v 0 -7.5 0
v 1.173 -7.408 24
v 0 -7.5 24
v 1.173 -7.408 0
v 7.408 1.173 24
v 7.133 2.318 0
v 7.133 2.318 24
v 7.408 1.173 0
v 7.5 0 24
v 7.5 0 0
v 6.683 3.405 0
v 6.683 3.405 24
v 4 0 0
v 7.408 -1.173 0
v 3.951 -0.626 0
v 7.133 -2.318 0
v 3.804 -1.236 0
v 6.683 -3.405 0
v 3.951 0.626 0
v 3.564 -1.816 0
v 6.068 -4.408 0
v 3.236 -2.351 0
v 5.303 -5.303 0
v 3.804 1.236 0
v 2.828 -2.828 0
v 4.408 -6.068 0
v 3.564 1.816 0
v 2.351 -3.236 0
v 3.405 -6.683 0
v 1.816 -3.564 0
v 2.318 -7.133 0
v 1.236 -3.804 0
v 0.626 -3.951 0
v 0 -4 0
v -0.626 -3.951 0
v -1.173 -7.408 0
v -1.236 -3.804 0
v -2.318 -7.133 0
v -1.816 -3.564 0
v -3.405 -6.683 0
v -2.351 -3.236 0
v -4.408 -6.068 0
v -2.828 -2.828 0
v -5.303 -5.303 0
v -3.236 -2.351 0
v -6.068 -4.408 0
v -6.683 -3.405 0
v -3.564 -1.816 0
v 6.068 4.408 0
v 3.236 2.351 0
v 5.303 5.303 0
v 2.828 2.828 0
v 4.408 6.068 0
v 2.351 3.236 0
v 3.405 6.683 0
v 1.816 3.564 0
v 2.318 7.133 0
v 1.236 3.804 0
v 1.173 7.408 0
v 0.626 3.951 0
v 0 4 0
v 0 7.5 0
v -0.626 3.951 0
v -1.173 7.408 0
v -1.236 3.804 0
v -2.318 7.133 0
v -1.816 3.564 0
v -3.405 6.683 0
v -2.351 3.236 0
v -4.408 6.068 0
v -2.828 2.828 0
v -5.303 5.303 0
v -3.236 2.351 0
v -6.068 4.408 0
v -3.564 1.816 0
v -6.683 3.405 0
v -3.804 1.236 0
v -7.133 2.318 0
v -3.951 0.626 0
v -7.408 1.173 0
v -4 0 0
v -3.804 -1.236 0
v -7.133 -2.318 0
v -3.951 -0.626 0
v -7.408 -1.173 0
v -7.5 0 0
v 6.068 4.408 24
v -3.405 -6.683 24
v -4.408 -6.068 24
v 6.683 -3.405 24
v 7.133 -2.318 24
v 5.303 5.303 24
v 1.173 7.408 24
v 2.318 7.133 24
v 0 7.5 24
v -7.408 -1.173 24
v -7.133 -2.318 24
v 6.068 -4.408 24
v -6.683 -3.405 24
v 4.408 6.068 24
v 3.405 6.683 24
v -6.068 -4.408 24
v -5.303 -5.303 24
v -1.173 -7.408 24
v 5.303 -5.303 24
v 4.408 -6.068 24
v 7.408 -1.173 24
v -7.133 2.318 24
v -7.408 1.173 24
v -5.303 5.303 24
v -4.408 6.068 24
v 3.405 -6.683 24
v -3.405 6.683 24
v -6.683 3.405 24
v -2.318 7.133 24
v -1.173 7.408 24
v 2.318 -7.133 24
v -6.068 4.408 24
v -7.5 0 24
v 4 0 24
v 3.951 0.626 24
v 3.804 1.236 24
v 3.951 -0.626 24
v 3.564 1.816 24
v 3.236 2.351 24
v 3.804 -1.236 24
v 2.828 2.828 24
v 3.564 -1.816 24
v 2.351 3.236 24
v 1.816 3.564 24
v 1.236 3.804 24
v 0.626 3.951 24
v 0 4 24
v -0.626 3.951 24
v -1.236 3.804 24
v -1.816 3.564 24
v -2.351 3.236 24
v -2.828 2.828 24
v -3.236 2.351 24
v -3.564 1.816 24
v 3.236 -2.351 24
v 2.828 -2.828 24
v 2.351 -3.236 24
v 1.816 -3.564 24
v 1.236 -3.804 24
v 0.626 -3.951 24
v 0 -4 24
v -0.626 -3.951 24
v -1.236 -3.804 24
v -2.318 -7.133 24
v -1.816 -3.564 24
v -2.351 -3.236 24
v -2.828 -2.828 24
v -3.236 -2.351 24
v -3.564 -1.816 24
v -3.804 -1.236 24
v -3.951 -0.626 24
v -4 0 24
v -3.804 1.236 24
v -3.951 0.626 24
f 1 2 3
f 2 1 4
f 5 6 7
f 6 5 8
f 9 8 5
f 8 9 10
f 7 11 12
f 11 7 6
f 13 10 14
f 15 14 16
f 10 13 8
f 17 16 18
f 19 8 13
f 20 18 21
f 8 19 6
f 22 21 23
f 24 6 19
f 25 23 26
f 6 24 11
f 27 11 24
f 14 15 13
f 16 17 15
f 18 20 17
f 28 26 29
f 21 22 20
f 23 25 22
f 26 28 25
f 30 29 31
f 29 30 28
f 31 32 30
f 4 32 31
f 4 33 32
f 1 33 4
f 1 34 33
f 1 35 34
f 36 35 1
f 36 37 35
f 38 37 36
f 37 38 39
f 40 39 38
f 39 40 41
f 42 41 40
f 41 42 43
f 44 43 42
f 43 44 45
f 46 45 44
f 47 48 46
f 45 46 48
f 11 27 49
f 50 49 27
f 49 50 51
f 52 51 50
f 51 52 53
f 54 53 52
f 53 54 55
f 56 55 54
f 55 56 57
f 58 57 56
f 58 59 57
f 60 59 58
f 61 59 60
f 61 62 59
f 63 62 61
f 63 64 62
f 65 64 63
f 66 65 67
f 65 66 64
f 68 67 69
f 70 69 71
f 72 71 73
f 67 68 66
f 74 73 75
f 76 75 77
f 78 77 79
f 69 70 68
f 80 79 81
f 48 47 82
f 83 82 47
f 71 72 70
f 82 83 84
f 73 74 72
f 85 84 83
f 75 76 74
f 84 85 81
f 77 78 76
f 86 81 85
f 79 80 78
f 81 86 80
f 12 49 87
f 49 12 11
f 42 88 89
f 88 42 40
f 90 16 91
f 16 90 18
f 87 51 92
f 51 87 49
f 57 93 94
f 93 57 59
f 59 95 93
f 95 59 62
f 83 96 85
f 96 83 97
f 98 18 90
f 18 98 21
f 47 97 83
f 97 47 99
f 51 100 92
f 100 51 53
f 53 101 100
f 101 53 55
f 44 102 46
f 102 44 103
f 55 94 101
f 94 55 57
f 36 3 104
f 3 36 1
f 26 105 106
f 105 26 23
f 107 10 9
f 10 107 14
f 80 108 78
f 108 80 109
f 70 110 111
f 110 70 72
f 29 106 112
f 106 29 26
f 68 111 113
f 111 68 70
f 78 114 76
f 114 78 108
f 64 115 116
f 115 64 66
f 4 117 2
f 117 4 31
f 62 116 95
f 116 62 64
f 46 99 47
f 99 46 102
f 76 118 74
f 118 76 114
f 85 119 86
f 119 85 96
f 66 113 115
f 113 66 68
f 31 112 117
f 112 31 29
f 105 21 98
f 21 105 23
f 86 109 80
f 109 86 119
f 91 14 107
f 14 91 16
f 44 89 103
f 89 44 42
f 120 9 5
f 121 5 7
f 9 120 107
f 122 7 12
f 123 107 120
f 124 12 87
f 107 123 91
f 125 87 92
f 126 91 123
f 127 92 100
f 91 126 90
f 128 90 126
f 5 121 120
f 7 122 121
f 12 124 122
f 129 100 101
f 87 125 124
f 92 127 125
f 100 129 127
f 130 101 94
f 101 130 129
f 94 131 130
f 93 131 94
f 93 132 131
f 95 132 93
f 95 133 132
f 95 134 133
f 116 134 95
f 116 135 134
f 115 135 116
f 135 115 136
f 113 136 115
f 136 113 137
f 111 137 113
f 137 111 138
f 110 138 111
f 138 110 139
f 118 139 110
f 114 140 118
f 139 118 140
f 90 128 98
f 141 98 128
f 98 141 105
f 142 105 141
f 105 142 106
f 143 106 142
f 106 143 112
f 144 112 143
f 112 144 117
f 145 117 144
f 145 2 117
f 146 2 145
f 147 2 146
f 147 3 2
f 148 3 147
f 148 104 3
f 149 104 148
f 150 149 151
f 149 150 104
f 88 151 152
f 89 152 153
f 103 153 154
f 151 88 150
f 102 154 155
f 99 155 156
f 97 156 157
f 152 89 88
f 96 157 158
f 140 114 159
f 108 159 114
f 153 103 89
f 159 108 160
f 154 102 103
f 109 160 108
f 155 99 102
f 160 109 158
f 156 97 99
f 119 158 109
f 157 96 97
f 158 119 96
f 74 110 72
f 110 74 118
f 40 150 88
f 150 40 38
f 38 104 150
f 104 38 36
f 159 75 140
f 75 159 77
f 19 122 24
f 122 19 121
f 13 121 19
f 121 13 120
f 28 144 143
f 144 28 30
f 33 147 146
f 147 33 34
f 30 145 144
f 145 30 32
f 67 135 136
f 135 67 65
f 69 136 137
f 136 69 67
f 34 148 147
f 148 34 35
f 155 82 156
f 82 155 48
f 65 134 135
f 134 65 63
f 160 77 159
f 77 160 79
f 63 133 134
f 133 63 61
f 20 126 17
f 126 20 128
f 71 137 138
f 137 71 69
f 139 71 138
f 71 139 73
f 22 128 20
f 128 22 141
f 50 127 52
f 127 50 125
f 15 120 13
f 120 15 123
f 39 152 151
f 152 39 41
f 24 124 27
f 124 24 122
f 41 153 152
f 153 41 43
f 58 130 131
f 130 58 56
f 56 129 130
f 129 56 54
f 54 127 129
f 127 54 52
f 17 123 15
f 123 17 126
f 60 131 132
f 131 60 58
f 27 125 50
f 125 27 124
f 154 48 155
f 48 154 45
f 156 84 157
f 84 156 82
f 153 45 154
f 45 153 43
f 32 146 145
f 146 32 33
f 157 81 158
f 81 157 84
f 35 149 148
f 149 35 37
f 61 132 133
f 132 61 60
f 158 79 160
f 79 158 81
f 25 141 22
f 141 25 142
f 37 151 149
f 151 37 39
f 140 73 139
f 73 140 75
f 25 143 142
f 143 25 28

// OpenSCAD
/*
ŁOŻYSKO LINIOWE LM8UU


*/

$fn = 40;
steel = [0.8, 0.8, 0.9];
LM08UU();
module LM08UU()
    {
        
    translate([0,0,24/2])
    color(steel) render() difference() 
    {
        cylinder(h=24, r=7.5, center=true);
        cylinder(h=30, r=4, center=true);
    }
}
